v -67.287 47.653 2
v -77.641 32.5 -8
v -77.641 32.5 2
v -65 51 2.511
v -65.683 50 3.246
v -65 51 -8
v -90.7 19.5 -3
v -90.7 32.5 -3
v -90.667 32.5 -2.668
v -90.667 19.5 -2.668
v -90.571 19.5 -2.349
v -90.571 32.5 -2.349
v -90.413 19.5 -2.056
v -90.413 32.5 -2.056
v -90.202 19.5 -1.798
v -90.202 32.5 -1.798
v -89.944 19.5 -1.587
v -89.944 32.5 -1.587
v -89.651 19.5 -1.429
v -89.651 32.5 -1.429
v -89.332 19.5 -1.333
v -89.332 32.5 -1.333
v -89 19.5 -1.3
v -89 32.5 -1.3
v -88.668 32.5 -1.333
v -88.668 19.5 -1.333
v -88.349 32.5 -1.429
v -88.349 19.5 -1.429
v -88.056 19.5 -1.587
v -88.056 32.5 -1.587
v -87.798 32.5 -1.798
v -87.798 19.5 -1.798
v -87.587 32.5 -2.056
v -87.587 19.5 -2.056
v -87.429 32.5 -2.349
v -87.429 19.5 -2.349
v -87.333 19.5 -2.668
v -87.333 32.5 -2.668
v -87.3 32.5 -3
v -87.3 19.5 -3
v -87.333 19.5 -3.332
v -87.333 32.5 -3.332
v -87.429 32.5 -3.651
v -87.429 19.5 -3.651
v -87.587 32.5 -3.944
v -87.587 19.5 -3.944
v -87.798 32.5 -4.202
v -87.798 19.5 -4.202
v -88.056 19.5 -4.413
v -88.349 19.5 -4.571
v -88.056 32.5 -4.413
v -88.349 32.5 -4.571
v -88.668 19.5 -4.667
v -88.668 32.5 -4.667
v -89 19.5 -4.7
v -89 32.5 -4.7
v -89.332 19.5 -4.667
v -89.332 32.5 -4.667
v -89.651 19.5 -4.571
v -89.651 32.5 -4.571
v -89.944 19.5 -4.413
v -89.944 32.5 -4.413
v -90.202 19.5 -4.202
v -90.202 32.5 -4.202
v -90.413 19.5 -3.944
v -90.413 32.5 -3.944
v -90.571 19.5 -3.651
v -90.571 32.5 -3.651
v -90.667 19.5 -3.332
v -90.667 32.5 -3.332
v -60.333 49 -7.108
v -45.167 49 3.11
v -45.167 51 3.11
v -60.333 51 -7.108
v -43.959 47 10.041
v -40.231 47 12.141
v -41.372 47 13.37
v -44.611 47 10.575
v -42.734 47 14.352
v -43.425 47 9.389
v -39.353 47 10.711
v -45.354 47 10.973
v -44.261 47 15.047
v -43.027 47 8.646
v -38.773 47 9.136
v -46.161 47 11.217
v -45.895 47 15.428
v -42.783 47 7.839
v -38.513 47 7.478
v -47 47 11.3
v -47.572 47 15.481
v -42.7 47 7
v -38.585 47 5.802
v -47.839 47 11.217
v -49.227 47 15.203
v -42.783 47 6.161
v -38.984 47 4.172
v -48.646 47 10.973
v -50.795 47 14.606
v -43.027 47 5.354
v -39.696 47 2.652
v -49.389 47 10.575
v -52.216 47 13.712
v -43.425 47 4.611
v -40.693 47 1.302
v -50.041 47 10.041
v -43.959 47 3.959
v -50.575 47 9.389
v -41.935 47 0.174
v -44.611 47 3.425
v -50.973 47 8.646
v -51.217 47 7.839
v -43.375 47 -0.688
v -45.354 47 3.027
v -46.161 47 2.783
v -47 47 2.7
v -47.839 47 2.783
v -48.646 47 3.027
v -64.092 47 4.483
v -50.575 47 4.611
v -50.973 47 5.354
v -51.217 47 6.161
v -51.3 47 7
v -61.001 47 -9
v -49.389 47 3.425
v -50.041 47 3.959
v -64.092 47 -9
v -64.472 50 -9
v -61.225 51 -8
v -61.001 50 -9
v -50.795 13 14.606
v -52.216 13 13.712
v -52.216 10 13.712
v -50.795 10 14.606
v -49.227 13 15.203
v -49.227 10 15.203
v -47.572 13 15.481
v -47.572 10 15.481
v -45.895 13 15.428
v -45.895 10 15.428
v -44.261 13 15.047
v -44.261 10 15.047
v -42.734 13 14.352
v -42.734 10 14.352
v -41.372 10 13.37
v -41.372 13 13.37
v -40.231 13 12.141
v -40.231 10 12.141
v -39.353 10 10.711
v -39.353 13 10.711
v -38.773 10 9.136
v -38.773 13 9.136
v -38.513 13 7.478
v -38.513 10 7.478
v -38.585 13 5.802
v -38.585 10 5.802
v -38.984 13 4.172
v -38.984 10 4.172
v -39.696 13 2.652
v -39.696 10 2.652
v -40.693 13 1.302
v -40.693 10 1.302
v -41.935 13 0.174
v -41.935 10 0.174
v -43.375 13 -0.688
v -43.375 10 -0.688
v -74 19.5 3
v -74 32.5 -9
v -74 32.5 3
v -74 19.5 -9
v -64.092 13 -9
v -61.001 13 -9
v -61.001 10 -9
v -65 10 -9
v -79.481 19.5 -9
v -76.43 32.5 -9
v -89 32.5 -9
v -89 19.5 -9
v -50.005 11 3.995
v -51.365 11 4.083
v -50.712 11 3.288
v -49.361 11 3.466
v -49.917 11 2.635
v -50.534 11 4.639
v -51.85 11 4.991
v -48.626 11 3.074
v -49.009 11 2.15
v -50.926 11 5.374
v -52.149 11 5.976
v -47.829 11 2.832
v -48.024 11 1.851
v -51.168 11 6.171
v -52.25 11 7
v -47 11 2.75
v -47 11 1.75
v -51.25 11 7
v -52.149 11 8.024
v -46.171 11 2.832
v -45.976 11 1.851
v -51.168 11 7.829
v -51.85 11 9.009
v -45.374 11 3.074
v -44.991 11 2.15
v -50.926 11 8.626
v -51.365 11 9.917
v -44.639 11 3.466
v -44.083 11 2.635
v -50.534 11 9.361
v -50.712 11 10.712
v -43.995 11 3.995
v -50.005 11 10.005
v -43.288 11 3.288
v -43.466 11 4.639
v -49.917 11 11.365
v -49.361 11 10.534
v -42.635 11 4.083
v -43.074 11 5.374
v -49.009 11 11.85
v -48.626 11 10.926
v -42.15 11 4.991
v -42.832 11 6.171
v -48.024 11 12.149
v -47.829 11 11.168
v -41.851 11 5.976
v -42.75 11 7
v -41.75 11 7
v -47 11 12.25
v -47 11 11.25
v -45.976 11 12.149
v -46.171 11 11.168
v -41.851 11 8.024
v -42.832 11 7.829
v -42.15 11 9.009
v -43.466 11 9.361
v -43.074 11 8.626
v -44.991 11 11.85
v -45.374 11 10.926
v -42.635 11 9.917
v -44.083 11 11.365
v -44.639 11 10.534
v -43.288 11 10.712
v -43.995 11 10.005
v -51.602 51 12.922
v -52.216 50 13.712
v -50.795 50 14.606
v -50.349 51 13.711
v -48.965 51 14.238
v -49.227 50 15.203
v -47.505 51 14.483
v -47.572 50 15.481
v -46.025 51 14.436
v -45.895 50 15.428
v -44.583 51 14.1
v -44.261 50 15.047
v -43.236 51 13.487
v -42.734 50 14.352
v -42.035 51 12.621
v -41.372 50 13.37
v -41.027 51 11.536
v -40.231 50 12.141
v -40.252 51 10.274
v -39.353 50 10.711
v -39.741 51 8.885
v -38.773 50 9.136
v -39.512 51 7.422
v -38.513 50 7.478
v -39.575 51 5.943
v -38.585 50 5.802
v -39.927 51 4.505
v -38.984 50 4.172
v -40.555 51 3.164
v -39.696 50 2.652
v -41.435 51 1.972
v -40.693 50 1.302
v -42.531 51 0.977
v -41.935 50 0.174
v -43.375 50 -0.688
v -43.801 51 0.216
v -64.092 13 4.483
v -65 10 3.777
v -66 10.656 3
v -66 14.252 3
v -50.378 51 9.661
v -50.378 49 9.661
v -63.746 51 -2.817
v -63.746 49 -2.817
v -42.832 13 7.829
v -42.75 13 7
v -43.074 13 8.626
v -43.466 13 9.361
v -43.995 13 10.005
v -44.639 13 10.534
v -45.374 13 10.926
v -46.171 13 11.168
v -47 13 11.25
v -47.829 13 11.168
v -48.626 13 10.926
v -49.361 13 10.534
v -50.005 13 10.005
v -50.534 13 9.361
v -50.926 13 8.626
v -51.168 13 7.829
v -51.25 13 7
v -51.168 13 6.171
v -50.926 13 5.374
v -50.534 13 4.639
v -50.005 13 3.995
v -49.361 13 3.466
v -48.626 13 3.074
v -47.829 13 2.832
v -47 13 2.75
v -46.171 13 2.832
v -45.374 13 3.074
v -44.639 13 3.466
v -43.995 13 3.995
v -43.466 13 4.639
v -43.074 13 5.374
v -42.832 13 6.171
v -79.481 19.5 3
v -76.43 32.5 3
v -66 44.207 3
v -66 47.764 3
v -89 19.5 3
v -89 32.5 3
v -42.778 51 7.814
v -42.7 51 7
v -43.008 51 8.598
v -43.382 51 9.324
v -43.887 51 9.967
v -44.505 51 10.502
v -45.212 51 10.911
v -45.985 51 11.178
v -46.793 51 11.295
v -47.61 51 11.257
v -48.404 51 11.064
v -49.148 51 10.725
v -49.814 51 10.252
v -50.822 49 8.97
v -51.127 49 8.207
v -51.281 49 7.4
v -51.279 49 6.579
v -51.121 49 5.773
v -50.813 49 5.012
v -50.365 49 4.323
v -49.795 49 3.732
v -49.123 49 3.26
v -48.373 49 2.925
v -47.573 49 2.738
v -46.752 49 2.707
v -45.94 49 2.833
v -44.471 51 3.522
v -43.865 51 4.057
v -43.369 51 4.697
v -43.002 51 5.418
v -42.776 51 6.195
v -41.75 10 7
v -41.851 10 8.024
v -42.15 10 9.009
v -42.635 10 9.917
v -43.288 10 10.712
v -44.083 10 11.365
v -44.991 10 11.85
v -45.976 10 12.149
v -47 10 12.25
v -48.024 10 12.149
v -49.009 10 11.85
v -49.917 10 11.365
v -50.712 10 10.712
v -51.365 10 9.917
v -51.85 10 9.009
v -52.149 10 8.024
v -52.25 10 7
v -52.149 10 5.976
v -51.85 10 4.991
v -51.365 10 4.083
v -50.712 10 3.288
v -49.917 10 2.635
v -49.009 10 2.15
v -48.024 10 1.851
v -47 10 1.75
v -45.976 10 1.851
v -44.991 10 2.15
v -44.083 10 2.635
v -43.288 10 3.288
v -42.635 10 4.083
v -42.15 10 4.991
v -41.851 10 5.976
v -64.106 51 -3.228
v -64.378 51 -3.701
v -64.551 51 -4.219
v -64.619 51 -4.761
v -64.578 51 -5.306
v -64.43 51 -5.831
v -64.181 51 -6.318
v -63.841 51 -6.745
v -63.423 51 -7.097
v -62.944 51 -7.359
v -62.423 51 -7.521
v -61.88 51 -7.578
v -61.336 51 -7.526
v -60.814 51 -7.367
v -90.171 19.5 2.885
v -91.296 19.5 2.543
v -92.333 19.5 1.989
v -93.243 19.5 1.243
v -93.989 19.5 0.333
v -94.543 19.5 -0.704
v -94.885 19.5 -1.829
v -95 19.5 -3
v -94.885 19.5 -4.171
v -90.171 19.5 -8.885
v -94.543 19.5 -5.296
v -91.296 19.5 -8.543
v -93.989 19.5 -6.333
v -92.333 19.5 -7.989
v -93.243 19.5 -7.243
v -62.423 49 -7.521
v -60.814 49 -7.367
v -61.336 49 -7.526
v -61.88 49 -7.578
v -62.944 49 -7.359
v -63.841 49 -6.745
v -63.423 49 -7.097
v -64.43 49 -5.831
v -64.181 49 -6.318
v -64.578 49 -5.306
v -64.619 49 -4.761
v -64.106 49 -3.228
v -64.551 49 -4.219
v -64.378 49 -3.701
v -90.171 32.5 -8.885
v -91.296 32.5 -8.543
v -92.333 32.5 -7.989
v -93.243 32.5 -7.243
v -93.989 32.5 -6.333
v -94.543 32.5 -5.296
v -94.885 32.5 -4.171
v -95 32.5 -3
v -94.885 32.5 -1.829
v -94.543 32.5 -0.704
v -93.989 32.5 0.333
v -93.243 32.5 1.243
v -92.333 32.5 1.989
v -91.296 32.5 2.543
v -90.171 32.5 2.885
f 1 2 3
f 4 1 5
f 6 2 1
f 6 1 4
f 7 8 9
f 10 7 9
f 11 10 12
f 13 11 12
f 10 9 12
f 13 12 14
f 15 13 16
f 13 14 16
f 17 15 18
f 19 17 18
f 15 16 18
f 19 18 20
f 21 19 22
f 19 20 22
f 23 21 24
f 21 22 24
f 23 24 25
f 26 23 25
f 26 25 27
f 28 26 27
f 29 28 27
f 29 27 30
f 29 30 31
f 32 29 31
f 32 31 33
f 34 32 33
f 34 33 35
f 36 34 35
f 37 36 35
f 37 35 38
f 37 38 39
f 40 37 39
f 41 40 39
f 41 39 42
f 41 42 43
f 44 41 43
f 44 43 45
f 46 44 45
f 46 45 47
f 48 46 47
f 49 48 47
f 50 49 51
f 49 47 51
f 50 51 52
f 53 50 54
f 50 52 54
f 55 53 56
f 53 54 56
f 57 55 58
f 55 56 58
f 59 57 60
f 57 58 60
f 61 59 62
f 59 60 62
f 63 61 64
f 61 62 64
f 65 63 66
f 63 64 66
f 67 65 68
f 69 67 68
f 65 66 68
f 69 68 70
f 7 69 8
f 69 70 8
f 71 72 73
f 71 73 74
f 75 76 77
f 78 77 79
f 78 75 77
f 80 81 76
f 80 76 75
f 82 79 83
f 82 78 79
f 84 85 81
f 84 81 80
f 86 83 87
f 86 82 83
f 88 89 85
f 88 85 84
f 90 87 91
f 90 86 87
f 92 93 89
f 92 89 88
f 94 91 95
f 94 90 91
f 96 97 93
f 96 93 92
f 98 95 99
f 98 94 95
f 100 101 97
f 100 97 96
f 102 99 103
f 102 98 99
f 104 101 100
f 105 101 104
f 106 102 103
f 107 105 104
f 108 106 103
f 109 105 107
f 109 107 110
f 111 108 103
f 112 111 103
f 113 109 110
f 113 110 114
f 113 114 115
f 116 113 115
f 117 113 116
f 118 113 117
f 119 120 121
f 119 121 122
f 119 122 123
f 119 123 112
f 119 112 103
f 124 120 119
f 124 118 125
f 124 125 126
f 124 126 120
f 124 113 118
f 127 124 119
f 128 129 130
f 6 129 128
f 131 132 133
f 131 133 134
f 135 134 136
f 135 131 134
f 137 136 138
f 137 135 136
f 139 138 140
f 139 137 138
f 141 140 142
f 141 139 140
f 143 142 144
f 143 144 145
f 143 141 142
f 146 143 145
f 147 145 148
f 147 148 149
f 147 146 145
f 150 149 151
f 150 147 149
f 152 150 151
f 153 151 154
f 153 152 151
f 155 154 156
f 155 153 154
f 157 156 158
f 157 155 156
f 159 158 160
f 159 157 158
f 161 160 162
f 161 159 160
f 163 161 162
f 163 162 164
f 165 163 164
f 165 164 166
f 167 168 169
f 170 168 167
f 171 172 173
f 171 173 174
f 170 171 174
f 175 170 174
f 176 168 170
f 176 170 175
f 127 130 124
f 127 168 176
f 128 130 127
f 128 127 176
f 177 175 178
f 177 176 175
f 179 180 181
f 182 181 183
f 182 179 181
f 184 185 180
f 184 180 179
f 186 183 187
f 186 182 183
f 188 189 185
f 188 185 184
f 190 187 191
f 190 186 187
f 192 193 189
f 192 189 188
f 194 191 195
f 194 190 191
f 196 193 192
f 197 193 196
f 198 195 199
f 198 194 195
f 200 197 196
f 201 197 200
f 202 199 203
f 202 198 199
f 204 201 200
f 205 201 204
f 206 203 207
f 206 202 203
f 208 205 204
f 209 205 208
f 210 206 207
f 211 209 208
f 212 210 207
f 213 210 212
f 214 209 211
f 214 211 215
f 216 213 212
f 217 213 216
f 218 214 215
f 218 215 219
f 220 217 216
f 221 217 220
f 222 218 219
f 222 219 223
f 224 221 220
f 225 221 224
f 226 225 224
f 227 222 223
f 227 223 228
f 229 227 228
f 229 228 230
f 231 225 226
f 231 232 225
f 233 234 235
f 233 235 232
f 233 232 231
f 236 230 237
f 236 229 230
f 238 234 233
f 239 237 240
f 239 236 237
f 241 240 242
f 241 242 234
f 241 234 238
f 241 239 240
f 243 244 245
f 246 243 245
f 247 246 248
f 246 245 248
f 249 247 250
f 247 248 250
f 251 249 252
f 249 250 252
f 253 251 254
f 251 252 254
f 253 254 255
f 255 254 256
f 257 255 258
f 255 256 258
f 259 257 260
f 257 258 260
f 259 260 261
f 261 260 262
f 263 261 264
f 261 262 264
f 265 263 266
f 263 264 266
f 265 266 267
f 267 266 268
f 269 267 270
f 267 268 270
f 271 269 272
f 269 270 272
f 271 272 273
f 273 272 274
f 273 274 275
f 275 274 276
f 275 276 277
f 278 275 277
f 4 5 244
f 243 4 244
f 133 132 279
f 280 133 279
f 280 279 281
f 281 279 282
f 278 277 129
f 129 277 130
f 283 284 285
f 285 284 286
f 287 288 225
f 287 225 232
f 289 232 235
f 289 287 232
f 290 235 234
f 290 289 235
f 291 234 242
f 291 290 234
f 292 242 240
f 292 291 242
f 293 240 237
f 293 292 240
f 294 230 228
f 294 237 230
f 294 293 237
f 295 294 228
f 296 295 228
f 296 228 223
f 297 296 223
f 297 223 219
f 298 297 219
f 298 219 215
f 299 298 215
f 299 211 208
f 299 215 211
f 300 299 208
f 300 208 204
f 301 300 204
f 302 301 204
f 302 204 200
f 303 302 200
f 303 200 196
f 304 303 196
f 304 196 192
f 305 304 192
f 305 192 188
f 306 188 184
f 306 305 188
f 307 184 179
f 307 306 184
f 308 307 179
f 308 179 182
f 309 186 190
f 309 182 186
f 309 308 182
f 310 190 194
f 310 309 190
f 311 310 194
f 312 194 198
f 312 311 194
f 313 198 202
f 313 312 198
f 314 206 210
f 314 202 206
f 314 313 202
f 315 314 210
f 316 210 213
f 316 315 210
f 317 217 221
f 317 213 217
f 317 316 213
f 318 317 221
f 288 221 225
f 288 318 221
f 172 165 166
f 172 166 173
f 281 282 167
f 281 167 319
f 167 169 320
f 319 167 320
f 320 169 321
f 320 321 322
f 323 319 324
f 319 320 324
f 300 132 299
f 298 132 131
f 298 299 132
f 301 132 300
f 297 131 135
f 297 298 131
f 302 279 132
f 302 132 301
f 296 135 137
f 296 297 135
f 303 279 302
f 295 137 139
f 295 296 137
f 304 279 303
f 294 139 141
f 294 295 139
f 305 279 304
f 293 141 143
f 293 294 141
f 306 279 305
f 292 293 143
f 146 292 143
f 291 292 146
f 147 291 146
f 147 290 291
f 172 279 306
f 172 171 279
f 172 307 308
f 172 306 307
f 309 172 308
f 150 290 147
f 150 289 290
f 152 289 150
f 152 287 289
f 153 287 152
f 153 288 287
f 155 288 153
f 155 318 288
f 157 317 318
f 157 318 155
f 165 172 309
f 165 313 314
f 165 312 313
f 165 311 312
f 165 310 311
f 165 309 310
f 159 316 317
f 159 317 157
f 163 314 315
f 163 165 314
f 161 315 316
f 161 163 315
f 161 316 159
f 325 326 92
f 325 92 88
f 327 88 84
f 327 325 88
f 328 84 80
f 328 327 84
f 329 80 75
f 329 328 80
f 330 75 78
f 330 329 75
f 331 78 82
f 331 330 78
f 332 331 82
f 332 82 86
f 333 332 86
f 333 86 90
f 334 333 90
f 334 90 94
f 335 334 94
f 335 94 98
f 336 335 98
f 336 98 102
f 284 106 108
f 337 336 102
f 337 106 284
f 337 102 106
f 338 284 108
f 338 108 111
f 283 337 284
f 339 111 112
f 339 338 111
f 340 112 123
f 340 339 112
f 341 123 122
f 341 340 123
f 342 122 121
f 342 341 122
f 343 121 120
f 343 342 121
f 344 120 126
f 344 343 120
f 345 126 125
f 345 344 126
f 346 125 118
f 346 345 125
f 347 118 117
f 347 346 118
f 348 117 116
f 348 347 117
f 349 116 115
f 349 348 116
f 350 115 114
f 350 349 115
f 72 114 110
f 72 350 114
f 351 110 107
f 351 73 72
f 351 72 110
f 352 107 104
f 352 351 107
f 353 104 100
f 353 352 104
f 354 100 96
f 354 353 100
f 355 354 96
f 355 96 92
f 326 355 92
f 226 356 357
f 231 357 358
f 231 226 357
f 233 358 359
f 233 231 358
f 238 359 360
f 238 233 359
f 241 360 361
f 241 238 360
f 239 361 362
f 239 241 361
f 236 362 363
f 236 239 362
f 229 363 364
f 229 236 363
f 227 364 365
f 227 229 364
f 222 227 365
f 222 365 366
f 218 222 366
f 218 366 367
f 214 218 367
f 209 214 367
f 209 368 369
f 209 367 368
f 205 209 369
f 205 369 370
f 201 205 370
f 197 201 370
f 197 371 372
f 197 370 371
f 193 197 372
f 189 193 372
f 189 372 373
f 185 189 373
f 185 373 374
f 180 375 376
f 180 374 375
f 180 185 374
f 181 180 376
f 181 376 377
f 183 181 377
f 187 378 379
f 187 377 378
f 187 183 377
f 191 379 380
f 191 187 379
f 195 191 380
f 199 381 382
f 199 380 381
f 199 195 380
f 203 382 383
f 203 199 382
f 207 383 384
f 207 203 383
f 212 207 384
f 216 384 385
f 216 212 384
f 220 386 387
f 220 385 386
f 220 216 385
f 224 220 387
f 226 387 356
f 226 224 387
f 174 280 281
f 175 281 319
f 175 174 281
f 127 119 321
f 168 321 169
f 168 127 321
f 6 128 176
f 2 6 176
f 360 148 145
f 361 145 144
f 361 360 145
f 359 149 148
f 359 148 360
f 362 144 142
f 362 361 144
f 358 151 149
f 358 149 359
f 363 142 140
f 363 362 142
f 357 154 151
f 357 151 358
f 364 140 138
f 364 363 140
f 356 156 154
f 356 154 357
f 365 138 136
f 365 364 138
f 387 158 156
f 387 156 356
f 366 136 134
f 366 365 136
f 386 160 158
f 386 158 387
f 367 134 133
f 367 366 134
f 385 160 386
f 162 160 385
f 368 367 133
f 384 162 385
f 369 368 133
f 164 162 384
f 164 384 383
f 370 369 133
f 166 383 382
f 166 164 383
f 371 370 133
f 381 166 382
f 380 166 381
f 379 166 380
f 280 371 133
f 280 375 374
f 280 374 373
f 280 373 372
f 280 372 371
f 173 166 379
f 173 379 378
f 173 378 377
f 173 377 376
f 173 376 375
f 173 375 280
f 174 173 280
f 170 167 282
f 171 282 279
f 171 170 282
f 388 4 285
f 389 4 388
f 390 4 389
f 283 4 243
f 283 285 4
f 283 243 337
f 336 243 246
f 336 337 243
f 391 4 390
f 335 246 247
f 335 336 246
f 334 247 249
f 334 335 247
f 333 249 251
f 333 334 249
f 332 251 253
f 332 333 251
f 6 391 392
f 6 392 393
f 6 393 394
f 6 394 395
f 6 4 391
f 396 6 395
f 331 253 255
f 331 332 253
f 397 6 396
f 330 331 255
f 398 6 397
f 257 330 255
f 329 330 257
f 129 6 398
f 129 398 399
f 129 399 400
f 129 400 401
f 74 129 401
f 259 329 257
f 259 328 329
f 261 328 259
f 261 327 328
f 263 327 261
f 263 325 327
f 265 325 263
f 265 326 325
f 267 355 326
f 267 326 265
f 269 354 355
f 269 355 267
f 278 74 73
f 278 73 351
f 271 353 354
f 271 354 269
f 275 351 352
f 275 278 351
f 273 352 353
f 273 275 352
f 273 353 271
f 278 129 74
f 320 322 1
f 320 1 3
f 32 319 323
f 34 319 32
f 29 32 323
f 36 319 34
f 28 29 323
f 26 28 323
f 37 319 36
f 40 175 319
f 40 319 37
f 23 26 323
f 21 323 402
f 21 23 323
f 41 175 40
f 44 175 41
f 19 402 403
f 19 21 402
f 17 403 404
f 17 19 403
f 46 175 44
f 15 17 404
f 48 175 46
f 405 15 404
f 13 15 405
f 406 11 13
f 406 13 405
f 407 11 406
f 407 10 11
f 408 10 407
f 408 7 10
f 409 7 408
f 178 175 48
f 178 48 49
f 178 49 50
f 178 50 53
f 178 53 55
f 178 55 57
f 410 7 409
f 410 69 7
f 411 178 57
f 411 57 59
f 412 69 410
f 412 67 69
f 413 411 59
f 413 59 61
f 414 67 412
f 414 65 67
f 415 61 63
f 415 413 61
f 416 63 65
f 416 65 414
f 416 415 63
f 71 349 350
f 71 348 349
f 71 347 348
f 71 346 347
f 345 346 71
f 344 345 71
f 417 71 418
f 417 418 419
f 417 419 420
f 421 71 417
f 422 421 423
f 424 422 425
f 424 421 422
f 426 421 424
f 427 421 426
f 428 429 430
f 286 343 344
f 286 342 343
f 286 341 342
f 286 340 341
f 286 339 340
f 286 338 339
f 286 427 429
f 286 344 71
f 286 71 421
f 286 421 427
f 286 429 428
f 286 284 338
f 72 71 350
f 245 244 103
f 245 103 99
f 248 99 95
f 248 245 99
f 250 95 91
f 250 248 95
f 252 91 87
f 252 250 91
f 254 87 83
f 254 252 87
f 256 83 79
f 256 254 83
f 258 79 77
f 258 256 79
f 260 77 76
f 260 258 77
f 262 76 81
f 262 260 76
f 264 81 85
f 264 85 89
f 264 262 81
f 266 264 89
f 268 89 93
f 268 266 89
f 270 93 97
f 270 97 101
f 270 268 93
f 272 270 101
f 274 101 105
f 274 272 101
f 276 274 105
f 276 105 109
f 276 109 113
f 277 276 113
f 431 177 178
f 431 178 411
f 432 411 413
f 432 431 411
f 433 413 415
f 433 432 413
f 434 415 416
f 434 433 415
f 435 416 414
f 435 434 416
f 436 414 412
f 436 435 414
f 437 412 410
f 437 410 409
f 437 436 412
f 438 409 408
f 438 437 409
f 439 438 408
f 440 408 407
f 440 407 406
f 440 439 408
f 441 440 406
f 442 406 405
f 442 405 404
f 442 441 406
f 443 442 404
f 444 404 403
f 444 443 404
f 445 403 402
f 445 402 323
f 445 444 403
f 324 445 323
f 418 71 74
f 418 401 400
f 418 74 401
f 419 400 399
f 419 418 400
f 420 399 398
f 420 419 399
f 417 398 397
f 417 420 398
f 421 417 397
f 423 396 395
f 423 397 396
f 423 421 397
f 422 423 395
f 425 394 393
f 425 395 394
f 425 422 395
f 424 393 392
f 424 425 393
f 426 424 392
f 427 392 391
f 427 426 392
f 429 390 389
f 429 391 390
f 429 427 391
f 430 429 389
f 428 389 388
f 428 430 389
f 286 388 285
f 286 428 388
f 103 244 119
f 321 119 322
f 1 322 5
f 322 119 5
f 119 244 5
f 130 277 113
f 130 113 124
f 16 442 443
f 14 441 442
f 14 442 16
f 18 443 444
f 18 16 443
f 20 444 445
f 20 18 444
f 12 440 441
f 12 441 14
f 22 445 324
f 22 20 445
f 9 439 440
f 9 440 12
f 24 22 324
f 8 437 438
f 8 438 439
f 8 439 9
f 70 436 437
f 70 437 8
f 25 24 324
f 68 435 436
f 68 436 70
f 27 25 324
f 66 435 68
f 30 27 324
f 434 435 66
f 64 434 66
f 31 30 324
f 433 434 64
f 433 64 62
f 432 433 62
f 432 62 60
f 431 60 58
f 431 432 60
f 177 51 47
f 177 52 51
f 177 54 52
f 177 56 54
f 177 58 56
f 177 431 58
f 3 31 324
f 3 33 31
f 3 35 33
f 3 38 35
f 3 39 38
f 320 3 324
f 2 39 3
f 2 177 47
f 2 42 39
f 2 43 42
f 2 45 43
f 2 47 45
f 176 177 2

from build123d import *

# Parameters (mm, degrees)
PAD012_DEPTH           = 10
CYLINDER024_R          = 4.3
CYLINDER024_DEPTH      = 14
CYLINDER024_ROLL_ANGLE = 90
CYLINDER017_R          = 4.25
CYLINDER017_DEPTH      = 10
CYLINDER016_R          = 5.25
CYLINDER016_DEPTH      = 10
FUSION009_ROLL_ANGLE   = 90
SKETCH005_R            = 1.7
PAD005_DEPTH           = 50
PAD006_DEPTH           = 40
CHAMFER004_SIZE        = 1


with BuildPart() as pad012:
    # Sketch012 → Pad012 (new body)
    with BuildSketch(Plane(origin=(0, 49, 0), x_dir=(-1, 0, 0), z_dir=(0, 1, 0))):
        with BuildLine():
            ThreePointArc((49.900014, 10.106834), (43.673915, 9.645687), (44.625156, 3.475427))
            Line((44.625156, 3.475427), (60.33289, -7.108383))
            ThreePointArc((60.33289, -7.108383), (64.021726, -6.539695), (63.746037, -2.817476))
            Line((49.900014, 10.106834), (63.746037, -2.817476))
        make_face()
    extrude(amount=PAD012_DEPTH)


with BuildPart() as fusion025:
    # Cylinder024 → Cylinder024 (new body)
    with BuildSketch(Plane.XY):
        Circle(CYLINDER024_R)
    extrude(amount=CYLINDER024_DEPTH)


with BuildPart() as fusion025_1:
    # Cylinder024 roll: moved
    add(fusion025.part.rotate(Axis((0, 0, 0), (1, 0, 0)), CYLINDER024_ROLL_ANGLE))


with BuildPart() as fusion025_2:
    # Cylinder024 placement: moved
    add(fusion025_1.part.moved(Location((-47, 58, 7))))

    # Fusion025: union Pad012
    add(pad012.part)


with BuildPart() as cylinder017:
    # Cylinder017 → Cylinder017 (new body)
    with BuildSketch(Plane.XY.offset(-5)):
        Circle(CYLINDER017_R)
    extrude(amount=CYLINDER017_DEPTH)


with BuildPart() as fusion009:
    # Cylinder016 → Cylinder016 (new body)
    with BuildSketch(Plane.XY):
        Circle(CYLINDER016_R)
    extrude(amount=CYLINDER016_DEPTH)

    # Fusion009: union Cylinder017
    add(cylinder017.part)


with BuildPart() as fusion009_1:
    # Fusion009 roll: moved
    add(fusion009.part.rotate(Axis((0, 0, 0), (1, 0, 0)), FUSION009_ROLL_ANGLE))


with BuildPart() as fusion009_2:
    # Fusion009 placement: moved
    add(fusion009_1.part.moved(Location((-47, 11, 7))))


with BuildPart() as pad005:
    # Sketch005 → Pad005 (new body)
    with BuildSketch(Plane(origin=(0, 55, 0), x_dir=(-1, 0, 0), z_dir=(0, 1, 0))):
        with BuildLine():
            ThreePointArc((52.215569, 13.711769), (39.756321, 11.447371), (43.374568, -0.688059))
            Line((43.374568, -0.688059), (61.000798, -9))
            Line((61.000798, -9), (89.000022, -9))
            ThreePointArc((89.000022, -9), (95, -3), (89.000022, 3))
            Line((66.000242, 3), (89.000022, 3))
            Line((52.215569, 13.711769), (66.000242, 3))
        make_face()
        with Locations((47, 7)):
            Circle(SKETCH005_R, mode=Mode.SUBTRACT)
        with Locations((89, -3)):
            Circle(SKETCH005_R, mode=Mode.SUBTRACT)
    extrude(amount=-PAD005_DEPTH)


with BuildPart() as cut036:
    # Sketch006 → Pad006 (new body)
    with BuildSketch(Plane.XY.offset(-20)):
        Polygon((-102.641426, 32.5), (-77.641426, 32.5), (-65, 51), (-36, 51), (-36, 47), (-64.091855, 47), (-74, 32.5), (-74, 19.5), (-64.091855, 13), (-36, 13), (-36, 10), (-65, 10), (-79.481134, 19.5), (-102.641426, 19.5), align=None)
    extrude(amount=PAD006_DEPTH)

    # Common: intersect Pad005
    add(pad005.part, mode=Mode.INTERSECT)

    # Chamfer004
    chamfer004_edges = [cut036.edges().sort_by_distance(p)[0] for p in [
        (-71.320713, 41.75, -9),
        (-71.820834, 41.018102, 3),
        (-63.000399, 51, -9),
        (-52.187683, 51, -4.844029),
        (-39.756321, 51, 11.447371),
    ]]
    chamfer(chamfer004_edges, length=CHAMFER004_SIZE)

    # Cut013: cut Fusion009
    add(fusion009_2.part, mode=Mode.SUBTRACT)

    # Cut036: cut Fusion025
    add(fusion025_2.part, mode=Mode.SUBTRACT)


solid = cut036.part
